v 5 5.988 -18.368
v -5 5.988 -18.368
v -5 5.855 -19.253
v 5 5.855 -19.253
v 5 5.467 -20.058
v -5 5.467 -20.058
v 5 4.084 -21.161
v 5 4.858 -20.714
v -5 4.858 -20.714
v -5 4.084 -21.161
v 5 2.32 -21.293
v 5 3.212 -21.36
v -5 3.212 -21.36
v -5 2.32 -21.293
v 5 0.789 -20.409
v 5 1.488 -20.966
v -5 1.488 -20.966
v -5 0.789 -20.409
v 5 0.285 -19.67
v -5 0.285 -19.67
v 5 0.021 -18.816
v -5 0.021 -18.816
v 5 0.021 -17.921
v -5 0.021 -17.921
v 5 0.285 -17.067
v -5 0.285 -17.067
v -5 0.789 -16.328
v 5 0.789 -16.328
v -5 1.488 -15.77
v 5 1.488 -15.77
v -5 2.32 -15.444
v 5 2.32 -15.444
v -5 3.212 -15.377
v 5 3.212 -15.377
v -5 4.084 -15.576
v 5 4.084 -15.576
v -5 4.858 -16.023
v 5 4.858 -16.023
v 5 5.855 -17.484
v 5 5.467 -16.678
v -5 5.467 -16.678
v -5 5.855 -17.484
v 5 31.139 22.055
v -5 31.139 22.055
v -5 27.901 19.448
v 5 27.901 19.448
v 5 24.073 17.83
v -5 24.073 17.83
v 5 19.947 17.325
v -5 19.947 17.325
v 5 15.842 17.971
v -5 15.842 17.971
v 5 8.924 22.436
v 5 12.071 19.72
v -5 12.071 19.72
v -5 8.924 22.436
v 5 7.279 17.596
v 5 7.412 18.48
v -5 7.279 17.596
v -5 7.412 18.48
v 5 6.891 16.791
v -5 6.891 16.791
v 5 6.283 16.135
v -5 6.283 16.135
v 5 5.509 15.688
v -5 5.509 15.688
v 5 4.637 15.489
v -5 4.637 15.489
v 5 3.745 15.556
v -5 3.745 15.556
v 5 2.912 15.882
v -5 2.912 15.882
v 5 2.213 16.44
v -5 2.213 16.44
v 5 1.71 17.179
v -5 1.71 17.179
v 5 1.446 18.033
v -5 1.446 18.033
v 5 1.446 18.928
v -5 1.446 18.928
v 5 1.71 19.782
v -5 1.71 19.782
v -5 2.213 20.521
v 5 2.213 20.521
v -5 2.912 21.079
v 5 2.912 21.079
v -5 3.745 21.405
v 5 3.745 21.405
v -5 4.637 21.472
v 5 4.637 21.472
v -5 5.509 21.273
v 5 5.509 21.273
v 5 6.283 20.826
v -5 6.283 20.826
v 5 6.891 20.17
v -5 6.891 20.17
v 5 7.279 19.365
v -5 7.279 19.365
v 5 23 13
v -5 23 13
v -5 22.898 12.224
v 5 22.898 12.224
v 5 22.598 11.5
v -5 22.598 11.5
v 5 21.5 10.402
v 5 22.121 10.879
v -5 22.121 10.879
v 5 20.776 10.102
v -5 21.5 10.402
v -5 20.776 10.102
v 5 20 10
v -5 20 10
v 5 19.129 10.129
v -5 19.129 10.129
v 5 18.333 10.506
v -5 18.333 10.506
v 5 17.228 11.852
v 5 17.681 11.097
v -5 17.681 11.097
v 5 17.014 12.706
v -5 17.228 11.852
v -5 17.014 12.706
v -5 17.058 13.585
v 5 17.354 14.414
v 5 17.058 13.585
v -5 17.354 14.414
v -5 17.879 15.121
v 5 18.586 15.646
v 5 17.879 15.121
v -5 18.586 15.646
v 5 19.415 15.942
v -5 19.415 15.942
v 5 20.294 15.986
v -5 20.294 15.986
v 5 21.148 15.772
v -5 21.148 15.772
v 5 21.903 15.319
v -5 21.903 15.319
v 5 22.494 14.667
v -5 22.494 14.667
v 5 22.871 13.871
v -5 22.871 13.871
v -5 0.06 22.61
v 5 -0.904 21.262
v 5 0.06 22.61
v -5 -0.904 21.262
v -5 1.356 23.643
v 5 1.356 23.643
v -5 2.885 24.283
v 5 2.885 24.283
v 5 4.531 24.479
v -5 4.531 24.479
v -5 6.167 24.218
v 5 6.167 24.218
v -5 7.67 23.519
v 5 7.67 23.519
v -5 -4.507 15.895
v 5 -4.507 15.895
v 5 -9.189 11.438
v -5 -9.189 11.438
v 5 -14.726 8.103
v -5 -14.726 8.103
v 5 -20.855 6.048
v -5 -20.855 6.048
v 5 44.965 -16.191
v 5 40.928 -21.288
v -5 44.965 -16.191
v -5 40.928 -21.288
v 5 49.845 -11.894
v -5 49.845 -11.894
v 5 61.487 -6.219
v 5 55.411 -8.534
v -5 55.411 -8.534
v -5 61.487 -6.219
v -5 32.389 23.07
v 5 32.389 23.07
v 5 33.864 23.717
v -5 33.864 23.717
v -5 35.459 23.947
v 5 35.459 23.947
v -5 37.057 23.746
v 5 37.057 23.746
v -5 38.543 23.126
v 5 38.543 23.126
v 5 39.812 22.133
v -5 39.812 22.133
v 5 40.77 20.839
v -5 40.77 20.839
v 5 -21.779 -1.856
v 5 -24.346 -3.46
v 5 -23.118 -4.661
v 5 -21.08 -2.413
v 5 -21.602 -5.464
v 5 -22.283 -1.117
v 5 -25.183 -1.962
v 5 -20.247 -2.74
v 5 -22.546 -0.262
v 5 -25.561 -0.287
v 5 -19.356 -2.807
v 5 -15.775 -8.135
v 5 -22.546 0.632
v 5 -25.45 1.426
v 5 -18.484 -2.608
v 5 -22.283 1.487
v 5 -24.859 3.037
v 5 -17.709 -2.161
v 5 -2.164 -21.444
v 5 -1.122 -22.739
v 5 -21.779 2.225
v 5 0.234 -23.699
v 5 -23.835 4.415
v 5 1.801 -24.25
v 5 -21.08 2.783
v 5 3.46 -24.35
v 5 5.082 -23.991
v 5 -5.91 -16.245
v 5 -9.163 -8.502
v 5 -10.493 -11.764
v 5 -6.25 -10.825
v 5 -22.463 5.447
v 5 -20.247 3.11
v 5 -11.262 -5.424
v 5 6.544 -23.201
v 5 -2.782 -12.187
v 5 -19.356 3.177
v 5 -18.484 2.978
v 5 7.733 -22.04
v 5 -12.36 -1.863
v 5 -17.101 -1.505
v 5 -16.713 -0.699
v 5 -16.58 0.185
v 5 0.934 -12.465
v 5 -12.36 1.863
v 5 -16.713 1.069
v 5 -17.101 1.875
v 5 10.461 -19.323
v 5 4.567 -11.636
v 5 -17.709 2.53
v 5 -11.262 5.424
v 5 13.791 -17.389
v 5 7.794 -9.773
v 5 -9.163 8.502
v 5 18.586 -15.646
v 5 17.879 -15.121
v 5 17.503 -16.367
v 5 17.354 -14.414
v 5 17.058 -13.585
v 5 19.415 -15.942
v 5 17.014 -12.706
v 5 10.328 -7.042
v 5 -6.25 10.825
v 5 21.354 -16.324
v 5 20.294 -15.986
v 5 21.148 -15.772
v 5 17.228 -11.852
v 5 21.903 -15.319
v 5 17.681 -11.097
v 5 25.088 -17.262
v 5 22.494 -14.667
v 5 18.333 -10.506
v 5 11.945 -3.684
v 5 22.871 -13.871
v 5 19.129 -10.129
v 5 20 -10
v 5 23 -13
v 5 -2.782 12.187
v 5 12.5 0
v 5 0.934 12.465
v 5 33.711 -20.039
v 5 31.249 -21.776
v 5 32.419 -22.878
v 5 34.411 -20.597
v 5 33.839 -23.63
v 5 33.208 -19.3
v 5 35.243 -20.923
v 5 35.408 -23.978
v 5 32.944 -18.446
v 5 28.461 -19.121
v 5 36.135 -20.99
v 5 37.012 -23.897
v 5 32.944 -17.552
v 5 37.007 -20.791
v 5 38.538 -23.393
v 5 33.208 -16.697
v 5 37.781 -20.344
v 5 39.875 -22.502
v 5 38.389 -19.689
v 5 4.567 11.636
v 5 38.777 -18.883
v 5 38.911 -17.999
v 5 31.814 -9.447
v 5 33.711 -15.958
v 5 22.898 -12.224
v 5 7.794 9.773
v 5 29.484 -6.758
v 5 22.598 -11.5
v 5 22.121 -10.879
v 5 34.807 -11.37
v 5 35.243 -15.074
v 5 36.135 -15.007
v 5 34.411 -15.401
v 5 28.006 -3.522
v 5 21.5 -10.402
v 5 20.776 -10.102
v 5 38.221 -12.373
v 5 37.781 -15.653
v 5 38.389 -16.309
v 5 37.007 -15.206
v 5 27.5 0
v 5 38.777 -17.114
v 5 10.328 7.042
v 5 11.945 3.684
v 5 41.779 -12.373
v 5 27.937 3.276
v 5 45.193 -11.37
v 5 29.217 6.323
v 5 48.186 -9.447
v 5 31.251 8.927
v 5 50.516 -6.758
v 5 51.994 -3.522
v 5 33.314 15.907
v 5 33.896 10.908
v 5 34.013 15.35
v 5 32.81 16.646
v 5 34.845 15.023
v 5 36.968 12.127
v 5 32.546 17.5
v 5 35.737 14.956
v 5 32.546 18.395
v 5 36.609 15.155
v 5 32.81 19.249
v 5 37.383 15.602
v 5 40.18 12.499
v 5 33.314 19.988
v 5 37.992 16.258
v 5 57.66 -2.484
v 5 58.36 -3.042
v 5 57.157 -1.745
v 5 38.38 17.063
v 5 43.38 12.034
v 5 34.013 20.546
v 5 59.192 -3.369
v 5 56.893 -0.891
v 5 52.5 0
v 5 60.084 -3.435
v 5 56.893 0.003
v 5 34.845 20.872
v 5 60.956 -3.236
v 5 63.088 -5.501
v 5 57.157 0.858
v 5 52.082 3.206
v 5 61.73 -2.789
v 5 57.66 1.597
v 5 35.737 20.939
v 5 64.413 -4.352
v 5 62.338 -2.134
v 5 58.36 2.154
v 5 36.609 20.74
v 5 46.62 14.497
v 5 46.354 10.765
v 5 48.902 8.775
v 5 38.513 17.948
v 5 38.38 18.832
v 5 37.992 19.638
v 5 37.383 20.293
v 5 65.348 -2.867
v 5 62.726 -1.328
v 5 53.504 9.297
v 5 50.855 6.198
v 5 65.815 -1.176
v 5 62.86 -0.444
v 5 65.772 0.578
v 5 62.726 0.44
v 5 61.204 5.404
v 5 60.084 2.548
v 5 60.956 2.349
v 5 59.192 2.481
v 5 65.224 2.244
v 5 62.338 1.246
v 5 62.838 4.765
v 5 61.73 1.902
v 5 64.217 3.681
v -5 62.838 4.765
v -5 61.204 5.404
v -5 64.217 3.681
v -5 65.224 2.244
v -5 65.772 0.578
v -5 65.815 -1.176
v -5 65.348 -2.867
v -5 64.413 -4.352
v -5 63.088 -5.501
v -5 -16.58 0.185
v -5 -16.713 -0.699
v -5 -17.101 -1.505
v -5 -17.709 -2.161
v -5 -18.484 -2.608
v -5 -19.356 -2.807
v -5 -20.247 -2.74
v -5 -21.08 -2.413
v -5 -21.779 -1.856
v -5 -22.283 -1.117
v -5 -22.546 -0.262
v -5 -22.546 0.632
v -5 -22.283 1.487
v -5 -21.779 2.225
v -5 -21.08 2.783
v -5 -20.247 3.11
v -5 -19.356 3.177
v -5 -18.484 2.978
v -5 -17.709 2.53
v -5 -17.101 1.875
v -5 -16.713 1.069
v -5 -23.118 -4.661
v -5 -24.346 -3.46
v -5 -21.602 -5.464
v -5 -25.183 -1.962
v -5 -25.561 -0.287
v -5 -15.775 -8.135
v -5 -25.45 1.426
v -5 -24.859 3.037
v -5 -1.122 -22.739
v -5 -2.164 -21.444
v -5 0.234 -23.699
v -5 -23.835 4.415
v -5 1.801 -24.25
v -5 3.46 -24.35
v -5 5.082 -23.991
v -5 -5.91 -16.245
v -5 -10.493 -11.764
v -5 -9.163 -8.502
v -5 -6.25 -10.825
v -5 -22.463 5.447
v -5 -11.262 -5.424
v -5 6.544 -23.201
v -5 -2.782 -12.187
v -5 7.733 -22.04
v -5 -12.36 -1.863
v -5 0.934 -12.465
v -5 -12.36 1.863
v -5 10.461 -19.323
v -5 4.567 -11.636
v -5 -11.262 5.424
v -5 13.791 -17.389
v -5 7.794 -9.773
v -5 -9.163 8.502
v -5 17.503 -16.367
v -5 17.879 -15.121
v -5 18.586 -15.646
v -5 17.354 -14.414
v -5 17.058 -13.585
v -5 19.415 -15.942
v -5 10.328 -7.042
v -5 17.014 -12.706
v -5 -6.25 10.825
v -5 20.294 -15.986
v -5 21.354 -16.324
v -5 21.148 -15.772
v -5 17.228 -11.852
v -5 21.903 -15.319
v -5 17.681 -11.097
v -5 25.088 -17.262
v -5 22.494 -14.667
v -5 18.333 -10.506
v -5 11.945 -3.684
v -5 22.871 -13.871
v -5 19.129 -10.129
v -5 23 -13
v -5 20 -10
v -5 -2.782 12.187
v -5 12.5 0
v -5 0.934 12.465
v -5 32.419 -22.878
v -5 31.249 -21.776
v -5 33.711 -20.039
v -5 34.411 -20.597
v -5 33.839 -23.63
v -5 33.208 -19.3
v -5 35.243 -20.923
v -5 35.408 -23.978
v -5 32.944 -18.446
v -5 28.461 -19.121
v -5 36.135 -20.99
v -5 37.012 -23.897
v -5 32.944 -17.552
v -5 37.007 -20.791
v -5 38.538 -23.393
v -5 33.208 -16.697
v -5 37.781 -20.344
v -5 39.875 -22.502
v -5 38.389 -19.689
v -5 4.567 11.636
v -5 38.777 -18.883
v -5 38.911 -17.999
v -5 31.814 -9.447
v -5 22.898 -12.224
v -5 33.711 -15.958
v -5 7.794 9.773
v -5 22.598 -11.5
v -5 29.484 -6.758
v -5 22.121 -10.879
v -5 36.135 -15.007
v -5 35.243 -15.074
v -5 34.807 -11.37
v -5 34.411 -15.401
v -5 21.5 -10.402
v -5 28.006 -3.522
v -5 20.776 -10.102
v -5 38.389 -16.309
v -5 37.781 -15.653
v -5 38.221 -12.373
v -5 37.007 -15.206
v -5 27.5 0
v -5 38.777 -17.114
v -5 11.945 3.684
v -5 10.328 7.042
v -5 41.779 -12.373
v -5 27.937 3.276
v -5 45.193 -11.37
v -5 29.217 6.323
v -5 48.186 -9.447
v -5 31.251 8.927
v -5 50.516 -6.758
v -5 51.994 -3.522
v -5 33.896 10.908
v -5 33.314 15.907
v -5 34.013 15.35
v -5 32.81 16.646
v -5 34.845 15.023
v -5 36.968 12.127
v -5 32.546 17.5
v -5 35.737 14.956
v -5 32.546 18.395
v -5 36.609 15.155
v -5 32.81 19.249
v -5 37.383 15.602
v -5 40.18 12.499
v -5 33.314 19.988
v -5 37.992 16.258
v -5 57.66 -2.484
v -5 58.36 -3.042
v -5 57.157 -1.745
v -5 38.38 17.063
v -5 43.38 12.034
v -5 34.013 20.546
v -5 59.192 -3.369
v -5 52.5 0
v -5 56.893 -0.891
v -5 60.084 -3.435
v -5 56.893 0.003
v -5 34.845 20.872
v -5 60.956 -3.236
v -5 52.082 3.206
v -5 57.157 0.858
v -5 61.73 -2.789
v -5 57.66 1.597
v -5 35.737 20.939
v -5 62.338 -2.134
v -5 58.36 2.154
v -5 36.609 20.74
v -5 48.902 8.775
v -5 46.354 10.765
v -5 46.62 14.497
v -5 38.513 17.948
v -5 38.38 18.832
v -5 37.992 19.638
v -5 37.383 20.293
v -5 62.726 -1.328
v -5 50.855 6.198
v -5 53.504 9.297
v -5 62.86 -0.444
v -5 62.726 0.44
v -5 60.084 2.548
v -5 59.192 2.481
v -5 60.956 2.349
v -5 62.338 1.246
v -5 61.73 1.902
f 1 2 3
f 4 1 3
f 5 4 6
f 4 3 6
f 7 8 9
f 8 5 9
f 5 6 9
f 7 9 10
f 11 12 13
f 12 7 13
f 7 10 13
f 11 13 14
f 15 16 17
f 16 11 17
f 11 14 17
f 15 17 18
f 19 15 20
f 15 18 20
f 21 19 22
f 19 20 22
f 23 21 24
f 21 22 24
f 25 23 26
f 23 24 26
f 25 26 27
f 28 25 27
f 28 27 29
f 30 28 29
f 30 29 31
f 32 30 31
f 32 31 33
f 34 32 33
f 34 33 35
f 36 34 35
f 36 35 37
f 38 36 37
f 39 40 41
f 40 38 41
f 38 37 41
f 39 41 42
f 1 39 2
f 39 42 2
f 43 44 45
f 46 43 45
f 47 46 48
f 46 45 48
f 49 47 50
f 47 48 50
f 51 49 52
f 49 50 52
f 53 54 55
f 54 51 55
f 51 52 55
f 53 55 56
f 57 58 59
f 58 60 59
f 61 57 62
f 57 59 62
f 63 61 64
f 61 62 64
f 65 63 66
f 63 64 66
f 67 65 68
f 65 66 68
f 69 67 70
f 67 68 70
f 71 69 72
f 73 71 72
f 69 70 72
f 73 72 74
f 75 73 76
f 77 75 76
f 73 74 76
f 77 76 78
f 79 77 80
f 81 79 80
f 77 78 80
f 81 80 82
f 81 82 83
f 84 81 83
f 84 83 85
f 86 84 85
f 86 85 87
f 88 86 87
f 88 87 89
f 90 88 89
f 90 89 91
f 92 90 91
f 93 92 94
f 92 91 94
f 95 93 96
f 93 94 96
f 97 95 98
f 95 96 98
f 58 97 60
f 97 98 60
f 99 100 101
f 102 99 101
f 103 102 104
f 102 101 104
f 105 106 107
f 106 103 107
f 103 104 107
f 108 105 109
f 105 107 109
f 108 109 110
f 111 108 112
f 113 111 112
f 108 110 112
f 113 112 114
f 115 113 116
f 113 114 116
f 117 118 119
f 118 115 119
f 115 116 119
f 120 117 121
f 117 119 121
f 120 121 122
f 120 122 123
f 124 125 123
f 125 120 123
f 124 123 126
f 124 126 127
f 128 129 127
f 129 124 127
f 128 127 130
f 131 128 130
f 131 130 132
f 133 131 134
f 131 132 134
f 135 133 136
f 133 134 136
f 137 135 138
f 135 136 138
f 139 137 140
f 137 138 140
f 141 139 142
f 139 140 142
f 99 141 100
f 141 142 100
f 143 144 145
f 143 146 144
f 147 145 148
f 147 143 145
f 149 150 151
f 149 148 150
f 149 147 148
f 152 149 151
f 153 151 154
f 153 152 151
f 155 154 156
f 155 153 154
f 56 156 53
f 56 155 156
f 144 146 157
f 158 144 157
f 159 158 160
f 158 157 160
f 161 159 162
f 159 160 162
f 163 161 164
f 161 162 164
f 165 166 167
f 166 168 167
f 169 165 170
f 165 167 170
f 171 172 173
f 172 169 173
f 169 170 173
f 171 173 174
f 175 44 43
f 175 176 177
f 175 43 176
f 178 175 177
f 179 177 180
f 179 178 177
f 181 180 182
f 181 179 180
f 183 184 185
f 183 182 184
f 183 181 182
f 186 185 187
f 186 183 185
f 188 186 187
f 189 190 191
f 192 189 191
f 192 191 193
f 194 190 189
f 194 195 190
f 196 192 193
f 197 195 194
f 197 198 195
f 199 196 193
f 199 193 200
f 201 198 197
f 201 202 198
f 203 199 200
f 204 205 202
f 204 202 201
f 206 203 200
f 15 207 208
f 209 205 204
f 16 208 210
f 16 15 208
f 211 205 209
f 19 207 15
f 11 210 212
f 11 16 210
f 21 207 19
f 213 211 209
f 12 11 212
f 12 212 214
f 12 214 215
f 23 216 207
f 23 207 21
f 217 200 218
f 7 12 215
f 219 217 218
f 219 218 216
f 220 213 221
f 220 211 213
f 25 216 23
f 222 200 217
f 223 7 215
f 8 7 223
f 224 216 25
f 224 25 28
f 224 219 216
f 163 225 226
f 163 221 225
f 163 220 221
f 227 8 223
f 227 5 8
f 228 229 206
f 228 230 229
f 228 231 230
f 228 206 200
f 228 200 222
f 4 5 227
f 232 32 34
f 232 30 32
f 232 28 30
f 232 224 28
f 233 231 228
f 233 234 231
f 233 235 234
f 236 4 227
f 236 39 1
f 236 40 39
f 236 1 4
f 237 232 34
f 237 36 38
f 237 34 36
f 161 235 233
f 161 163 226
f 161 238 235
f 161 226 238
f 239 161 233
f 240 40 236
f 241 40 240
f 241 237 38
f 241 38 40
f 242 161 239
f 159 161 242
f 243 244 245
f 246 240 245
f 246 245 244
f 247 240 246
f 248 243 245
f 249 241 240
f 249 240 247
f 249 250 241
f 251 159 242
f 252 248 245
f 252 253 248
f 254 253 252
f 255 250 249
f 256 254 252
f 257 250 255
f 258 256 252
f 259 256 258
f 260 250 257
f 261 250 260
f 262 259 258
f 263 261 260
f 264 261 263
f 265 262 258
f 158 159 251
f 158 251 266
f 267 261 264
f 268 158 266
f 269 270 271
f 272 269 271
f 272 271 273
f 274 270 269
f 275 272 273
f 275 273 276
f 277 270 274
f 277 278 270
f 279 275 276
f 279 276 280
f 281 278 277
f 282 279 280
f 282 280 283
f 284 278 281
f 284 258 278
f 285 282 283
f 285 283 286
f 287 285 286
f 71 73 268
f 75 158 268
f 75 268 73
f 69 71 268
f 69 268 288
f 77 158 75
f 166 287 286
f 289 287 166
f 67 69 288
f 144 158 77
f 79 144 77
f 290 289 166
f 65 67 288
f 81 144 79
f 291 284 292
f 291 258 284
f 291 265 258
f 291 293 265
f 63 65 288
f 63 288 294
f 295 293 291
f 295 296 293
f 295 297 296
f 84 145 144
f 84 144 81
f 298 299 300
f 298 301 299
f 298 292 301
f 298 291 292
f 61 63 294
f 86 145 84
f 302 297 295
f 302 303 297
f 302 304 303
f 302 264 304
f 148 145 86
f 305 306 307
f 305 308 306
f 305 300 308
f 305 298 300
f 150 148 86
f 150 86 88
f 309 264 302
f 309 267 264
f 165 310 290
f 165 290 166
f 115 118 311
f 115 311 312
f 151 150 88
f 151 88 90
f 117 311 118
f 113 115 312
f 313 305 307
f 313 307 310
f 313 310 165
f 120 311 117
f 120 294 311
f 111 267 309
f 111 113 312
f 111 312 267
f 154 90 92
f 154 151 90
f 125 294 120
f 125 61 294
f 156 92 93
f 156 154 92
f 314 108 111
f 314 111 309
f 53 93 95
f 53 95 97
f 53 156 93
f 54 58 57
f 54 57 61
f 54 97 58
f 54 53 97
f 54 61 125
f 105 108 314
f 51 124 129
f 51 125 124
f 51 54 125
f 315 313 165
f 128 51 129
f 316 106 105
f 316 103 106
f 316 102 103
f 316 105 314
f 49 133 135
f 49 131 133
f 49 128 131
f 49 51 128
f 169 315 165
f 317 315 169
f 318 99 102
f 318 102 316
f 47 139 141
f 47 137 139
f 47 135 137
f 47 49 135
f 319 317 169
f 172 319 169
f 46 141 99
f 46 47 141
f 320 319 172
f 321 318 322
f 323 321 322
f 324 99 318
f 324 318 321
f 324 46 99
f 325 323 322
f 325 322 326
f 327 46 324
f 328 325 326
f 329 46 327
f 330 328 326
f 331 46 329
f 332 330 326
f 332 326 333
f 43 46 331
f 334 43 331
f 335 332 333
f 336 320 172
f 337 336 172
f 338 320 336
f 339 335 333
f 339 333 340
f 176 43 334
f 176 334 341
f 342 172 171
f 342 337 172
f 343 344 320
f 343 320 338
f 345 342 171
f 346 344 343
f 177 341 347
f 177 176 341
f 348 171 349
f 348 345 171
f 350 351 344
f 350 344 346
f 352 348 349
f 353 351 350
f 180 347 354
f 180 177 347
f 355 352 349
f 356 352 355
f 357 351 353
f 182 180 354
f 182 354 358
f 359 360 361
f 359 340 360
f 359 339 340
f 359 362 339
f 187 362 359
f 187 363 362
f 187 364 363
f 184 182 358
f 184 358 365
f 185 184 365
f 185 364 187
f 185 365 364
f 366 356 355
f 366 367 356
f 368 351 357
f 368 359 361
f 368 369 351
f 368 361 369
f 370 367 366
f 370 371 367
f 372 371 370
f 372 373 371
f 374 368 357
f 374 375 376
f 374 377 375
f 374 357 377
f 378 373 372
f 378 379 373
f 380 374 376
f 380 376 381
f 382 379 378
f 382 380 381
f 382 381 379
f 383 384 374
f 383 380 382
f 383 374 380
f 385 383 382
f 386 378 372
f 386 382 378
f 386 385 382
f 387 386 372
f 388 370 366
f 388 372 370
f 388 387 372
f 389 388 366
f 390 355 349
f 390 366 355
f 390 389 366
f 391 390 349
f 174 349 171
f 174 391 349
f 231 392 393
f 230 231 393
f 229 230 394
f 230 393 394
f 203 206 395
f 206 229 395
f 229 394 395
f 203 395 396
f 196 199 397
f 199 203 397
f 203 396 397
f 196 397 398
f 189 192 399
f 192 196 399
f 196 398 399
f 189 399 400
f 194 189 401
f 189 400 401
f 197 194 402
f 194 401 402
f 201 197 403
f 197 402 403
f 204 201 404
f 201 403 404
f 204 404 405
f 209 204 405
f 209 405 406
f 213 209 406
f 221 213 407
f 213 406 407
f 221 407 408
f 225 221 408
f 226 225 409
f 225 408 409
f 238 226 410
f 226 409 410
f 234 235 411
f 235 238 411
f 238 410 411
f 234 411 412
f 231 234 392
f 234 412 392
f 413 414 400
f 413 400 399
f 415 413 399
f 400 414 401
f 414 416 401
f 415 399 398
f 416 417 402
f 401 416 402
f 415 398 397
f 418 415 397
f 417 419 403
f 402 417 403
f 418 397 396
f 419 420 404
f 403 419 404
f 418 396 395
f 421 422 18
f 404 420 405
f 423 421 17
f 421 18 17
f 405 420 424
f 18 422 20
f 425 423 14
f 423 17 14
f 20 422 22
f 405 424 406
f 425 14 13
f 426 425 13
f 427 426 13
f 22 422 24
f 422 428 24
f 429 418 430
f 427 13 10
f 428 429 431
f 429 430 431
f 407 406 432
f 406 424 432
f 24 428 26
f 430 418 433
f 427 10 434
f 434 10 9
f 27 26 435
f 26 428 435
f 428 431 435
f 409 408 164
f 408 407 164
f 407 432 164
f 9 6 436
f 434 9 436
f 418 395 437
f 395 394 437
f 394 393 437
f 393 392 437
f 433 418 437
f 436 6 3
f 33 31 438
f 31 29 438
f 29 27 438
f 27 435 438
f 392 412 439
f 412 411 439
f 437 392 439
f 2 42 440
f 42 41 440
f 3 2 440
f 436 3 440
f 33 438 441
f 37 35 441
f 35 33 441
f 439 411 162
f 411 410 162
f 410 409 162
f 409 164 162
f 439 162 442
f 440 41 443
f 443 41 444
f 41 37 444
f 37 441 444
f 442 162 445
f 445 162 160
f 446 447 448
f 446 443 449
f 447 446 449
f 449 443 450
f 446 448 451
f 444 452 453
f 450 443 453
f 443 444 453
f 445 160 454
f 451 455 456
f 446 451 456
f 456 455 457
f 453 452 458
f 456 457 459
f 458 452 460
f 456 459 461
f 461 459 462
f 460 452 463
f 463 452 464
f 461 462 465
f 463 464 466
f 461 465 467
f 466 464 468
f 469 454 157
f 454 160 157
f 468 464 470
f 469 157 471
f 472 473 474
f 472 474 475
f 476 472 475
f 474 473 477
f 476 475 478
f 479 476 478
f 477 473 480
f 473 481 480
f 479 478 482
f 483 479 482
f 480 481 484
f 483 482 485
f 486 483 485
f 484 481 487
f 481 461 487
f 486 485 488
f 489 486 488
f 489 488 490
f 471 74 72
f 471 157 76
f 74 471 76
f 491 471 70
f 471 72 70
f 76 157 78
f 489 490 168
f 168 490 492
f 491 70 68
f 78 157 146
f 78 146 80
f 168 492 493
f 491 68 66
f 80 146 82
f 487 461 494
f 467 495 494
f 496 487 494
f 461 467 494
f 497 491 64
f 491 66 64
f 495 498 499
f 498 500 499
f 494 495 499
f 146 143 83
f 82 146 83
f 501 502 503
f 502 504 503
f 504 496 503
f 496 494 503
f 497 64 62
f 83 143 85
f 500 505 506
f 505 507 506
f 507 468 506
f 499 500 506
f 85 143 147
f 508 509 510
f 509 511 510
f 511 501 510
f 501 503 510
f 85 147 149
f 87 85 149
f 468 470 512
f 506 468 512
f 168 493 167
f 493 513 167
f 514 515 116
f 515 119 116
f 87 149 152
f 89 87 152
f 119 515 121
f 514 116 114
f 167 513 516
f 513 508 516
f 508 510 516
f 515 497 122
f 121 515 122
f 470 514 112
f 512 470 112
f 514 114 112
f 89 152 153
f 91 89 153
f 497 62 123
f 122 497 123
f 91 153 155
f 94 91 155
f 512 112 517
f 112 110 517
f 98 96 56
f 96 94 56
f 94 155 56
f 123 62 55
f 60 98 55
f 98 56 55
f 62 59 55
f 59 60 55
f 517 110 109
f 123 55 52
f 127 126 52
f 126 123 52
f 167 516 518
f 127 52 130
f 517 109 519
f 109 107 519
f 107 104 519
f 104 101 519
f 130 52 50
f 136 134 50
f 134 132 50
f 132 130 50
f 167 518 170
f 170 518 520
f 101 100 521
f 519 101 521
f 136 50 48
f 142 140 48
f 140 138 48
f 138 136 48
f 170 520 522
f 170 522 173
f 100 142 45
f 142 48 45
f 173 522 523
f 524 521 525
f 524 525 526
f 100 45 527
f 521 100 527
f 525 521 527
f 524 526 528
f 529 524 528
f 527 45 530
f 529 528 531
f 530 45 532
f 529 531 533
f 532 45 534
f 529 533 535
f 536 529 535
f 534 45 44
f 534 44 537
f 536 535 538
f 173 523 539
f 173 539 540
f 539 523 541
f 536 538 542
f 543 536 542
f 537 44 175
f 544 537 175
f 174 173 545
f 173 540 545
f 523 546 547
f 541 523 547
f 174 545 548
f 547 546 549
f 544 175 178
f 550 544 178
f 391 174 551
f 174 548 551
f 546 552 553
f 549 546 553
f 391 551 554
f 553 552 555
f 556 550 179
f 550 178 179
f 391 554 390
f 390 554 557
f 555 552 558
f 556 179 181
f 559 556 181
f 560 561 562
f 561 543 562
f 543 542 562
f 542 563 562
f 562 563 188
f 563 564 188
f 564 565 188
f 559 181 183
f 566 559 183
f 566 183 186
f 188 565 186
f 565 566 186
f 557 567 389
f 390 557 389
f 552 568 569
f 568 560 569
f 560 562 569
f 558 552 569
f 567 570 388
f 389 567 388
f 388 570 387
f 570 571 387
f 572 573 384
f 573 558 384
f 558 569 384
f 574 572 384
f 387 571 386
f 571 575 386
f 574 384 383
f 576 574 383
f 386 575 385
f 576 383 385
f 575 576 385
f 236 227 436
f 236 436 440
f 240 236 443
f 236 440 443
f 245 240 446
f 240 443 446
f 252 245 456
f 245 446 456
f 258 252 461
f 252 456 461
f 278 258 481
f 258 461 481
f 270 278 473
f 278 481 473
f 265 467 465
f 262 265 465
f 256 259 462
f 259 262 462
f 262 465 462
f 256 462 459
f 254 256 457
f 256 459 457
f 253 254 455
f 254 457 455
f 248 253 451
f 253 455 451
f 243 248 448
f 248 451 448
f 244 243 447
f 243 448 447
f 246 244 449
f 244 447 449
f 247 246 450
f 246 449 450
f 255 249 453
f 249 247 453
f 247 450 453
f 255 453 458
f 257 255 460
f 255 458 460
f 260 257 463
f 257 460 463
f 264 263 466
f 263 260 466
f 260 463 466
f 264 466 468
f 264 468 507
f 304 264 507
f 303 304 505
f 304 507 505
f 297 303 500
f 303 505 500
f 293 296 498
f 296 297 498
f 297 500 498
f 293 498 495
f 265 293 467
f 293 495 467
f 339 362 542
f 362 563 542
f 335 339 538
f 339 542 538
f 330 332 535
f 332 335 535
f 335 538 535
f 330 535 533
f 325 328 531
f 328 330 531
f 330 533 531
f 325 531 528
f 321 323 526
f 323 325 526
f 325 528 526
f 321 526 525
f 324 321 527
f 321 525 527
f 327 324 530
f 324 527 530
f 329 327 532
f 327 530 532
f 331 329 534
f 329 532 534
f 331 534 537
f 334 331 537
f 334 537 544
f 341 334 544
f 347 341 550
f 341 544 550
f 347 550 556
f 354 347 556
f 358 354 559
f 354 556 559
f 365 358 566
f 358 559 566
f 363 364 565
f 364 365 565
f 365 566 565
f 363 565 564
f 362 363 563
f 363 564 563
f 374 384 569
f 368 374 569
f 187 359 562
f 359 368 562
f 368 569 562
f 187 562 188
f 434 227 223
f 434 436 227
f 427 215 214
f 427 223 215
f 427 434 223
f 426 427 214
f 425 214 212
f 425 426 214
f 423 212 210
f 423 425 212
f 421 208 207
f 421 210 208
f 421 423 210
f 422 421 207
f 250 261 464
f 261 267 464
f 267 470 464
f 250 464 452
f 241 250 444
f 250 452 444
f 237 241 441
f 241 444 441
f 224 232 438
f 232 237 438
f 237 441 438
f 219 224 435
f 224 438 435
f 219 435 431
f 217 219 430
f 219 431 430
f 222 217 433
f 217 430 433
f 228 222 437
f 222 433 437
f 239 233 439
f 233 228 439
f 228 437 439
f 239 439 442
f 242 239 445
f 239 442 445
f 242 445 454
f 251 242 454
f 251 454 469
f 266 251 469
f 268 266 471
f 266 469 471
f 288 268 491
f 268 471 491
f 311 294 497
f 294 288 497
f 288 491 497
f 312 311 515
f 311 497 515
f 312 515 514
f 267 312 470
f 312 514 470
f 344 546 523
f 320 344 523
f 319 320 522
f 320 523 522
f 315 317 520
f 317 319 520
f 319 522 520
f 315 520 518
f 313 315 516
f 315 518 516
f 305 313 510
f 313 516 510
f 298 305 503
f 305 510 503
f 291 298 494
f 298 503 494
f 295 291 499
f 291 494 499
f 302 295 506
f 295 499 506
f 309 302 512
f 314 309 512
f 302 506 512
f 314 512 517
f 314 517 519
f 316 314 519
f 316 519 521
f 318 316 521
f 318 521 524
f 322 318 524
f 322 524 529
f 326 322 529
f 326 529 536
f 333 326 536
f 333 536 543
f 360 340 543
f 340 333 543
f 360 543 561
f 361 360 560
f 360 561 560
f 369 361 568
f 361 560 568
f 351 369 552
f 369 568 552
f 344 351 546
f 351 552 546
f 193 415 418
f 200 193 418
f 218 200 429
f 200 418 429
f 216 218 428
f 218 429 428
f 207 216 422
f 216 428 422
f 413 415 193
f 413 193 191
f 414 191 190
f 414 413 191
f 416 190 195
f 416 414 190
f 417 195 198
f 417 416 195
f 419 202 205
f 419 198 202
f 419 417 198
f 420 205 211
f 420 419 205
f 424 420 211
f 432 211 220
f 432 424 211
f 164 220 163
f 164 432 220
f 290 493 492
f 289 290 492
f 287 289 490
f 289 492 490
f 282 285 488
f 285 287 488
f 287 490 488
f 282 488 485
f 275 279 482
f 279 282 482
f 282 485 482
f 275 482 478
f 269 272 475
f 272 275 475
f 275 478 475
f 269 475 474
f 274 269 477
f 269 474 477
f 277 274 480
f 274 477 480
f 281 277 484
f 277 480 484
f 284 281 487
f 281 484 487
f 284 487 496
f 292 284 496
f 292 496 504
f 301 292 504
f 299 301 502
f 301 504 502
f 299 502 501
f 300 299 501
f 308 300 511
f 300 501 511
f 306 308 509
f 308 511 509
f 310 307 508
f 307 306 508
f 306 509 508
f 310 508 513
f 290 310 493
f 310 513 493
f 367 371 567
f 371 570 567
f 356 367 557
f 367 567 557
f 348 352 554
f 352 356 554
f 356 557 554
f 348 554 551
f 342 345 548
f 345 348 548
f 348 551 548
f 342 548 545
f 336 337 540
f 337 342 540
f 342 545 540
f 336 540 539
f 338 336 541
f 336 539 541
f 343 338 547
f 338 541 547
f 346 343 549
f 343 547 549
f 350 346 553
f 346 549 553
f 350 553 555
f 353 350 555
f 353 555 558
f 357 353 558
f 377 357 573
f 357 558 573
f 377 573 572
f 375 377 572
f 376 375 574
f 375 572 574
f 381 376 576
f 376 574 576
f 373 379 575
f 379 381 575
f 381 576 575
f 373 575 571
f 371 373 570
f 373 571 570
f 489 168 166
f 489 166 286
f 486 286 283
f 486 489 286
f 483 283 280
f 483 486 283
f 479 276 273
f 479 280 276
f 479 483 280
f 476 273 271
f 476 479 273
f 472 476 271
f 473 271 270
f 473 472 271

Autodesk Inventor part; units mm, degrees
ref_plane "YZ Plane" through (0, 0, 0) normal (1, 0, 0) x (0, 1, 0)
ref_plane "XZ Plane" through (0, 0, 0) normal (0, 1, 0) x (-1, 0, 0)
ref_plane "XY Plane" through (0, 0, 0) normal (0, 0, 1) x (1, 0, 0)
sketch "Sketch2" plane through (0, 0, 0) normal (1, 0, 0) x (0, 1, 0)
  circle A0 centre (0, 0) radius 12.5
  line L0 (0, 0) -> (40, 0)
  circle A1 centre (40, 0) radius 12.5
  arc A2 (61.4867, -6.219) -> (61.2036, 5.4037) centre (59.8596, -0.4438) ccw
  circle A3 centre (59.8596, -0.4438) radius 3
  arc A4 (8.9245, 22.4355) -> (-0.904, 21.2616) centre (4.4125, 18.4805) ccw
  arc A5 (-2.1636, -21.4445) -> (7.7329, -22.0405) centre (2.9878, -18.3684) ccw
  arc A6 (31.2492, -21.7764) -> (40.9283, -21.2885) centre (35.9106, -17.9987) ccw
  arc A7 (40.7702, 20.8389) -> (36.9681, 12.1267) centre (35.5128, 17.9476) ccw
  line L1 (20, 0) -> (20, -13)
  line L2 (20, 0) -> (20, 13)
  arc A8 (-18.8462, 6.1399) -> (-21.6016, -5.4642) centre (-19.5799, 0.1849) ccw
  circle A9 centre (4.4125, 18.4805) radius 3
  circle A10 centre (2.9878, -18.3684) radius 3
  circle A11 centre (35.9106, -17.9987) radius 3
  circle A12 centre (35.5128, 17.9476) radius 3
  circle A13 centre (-19.5799, 0.1849) radius 3
  circle A14 centre (20, -13) radius 3
  circle A15 centre (20, 13) radius 3
  arc A16 (8.9245, 22.4355) -> (31.139, 22.0548) centre (20.2045, 32.323) ccw
  arc A17 (31.2492, -21.7764) -> (7.7329, -22.0405) centre (19.5956, -31.2207) ccw
  arc A18 (-2.1636, -21.4445) -> (-21.6016, -5.4642) centre (-34.1581, -40.5495) ccw
  arc A19 (-20.855, 6.0479) -> (-0.904, 21.2616) centre (-27.1495, 34.9909) ccw
  arc A20 (61.4867, -6.219) -> (40.9283, -21.2885) centre (71.3527, -41.2366) ccw
  arc A21 (7.2664, 17.5556) -> (-1.5702, 18.935) centre (0, 0) ccw
  arc A22 (40.7702, 20.8389) -> (61.2036, 5.4037) centre (79.072, 50.3008) ccw
  point P0 (-18.7745, -6.6085)
  point P1 (-17.6848, 6.9242)
  dimension "d4" = 25
  dimension "d22" = 6
  dimension "d1" = 25
  dimension "d3" = 40
  dimension "d6" = 12
  dimension "d7" = 6
  dimension "d12" = 12
  dimension "d13" = 12
  dimension "d15" = 12
  dimension "d16" = 12
  dimension "d17" = 13
  dimension "d18" = 13
  dimension "d21" = 12
  dimension "d23" = 6
  dimension "d24" = 6
  dimension "d25" = 6
  dimension "d26" = 6
  dimension "d27" = 6
  dimension "d28" = 6
  dimension "d29" = 15
  dimension "d30" = 15
  dimension "d31" = 37.2645
  dimension "d34" = 36.3809
extrude "Extrusion1" add sketch "Sketch2" along normal mid plane 10
properties part number "hw6"
